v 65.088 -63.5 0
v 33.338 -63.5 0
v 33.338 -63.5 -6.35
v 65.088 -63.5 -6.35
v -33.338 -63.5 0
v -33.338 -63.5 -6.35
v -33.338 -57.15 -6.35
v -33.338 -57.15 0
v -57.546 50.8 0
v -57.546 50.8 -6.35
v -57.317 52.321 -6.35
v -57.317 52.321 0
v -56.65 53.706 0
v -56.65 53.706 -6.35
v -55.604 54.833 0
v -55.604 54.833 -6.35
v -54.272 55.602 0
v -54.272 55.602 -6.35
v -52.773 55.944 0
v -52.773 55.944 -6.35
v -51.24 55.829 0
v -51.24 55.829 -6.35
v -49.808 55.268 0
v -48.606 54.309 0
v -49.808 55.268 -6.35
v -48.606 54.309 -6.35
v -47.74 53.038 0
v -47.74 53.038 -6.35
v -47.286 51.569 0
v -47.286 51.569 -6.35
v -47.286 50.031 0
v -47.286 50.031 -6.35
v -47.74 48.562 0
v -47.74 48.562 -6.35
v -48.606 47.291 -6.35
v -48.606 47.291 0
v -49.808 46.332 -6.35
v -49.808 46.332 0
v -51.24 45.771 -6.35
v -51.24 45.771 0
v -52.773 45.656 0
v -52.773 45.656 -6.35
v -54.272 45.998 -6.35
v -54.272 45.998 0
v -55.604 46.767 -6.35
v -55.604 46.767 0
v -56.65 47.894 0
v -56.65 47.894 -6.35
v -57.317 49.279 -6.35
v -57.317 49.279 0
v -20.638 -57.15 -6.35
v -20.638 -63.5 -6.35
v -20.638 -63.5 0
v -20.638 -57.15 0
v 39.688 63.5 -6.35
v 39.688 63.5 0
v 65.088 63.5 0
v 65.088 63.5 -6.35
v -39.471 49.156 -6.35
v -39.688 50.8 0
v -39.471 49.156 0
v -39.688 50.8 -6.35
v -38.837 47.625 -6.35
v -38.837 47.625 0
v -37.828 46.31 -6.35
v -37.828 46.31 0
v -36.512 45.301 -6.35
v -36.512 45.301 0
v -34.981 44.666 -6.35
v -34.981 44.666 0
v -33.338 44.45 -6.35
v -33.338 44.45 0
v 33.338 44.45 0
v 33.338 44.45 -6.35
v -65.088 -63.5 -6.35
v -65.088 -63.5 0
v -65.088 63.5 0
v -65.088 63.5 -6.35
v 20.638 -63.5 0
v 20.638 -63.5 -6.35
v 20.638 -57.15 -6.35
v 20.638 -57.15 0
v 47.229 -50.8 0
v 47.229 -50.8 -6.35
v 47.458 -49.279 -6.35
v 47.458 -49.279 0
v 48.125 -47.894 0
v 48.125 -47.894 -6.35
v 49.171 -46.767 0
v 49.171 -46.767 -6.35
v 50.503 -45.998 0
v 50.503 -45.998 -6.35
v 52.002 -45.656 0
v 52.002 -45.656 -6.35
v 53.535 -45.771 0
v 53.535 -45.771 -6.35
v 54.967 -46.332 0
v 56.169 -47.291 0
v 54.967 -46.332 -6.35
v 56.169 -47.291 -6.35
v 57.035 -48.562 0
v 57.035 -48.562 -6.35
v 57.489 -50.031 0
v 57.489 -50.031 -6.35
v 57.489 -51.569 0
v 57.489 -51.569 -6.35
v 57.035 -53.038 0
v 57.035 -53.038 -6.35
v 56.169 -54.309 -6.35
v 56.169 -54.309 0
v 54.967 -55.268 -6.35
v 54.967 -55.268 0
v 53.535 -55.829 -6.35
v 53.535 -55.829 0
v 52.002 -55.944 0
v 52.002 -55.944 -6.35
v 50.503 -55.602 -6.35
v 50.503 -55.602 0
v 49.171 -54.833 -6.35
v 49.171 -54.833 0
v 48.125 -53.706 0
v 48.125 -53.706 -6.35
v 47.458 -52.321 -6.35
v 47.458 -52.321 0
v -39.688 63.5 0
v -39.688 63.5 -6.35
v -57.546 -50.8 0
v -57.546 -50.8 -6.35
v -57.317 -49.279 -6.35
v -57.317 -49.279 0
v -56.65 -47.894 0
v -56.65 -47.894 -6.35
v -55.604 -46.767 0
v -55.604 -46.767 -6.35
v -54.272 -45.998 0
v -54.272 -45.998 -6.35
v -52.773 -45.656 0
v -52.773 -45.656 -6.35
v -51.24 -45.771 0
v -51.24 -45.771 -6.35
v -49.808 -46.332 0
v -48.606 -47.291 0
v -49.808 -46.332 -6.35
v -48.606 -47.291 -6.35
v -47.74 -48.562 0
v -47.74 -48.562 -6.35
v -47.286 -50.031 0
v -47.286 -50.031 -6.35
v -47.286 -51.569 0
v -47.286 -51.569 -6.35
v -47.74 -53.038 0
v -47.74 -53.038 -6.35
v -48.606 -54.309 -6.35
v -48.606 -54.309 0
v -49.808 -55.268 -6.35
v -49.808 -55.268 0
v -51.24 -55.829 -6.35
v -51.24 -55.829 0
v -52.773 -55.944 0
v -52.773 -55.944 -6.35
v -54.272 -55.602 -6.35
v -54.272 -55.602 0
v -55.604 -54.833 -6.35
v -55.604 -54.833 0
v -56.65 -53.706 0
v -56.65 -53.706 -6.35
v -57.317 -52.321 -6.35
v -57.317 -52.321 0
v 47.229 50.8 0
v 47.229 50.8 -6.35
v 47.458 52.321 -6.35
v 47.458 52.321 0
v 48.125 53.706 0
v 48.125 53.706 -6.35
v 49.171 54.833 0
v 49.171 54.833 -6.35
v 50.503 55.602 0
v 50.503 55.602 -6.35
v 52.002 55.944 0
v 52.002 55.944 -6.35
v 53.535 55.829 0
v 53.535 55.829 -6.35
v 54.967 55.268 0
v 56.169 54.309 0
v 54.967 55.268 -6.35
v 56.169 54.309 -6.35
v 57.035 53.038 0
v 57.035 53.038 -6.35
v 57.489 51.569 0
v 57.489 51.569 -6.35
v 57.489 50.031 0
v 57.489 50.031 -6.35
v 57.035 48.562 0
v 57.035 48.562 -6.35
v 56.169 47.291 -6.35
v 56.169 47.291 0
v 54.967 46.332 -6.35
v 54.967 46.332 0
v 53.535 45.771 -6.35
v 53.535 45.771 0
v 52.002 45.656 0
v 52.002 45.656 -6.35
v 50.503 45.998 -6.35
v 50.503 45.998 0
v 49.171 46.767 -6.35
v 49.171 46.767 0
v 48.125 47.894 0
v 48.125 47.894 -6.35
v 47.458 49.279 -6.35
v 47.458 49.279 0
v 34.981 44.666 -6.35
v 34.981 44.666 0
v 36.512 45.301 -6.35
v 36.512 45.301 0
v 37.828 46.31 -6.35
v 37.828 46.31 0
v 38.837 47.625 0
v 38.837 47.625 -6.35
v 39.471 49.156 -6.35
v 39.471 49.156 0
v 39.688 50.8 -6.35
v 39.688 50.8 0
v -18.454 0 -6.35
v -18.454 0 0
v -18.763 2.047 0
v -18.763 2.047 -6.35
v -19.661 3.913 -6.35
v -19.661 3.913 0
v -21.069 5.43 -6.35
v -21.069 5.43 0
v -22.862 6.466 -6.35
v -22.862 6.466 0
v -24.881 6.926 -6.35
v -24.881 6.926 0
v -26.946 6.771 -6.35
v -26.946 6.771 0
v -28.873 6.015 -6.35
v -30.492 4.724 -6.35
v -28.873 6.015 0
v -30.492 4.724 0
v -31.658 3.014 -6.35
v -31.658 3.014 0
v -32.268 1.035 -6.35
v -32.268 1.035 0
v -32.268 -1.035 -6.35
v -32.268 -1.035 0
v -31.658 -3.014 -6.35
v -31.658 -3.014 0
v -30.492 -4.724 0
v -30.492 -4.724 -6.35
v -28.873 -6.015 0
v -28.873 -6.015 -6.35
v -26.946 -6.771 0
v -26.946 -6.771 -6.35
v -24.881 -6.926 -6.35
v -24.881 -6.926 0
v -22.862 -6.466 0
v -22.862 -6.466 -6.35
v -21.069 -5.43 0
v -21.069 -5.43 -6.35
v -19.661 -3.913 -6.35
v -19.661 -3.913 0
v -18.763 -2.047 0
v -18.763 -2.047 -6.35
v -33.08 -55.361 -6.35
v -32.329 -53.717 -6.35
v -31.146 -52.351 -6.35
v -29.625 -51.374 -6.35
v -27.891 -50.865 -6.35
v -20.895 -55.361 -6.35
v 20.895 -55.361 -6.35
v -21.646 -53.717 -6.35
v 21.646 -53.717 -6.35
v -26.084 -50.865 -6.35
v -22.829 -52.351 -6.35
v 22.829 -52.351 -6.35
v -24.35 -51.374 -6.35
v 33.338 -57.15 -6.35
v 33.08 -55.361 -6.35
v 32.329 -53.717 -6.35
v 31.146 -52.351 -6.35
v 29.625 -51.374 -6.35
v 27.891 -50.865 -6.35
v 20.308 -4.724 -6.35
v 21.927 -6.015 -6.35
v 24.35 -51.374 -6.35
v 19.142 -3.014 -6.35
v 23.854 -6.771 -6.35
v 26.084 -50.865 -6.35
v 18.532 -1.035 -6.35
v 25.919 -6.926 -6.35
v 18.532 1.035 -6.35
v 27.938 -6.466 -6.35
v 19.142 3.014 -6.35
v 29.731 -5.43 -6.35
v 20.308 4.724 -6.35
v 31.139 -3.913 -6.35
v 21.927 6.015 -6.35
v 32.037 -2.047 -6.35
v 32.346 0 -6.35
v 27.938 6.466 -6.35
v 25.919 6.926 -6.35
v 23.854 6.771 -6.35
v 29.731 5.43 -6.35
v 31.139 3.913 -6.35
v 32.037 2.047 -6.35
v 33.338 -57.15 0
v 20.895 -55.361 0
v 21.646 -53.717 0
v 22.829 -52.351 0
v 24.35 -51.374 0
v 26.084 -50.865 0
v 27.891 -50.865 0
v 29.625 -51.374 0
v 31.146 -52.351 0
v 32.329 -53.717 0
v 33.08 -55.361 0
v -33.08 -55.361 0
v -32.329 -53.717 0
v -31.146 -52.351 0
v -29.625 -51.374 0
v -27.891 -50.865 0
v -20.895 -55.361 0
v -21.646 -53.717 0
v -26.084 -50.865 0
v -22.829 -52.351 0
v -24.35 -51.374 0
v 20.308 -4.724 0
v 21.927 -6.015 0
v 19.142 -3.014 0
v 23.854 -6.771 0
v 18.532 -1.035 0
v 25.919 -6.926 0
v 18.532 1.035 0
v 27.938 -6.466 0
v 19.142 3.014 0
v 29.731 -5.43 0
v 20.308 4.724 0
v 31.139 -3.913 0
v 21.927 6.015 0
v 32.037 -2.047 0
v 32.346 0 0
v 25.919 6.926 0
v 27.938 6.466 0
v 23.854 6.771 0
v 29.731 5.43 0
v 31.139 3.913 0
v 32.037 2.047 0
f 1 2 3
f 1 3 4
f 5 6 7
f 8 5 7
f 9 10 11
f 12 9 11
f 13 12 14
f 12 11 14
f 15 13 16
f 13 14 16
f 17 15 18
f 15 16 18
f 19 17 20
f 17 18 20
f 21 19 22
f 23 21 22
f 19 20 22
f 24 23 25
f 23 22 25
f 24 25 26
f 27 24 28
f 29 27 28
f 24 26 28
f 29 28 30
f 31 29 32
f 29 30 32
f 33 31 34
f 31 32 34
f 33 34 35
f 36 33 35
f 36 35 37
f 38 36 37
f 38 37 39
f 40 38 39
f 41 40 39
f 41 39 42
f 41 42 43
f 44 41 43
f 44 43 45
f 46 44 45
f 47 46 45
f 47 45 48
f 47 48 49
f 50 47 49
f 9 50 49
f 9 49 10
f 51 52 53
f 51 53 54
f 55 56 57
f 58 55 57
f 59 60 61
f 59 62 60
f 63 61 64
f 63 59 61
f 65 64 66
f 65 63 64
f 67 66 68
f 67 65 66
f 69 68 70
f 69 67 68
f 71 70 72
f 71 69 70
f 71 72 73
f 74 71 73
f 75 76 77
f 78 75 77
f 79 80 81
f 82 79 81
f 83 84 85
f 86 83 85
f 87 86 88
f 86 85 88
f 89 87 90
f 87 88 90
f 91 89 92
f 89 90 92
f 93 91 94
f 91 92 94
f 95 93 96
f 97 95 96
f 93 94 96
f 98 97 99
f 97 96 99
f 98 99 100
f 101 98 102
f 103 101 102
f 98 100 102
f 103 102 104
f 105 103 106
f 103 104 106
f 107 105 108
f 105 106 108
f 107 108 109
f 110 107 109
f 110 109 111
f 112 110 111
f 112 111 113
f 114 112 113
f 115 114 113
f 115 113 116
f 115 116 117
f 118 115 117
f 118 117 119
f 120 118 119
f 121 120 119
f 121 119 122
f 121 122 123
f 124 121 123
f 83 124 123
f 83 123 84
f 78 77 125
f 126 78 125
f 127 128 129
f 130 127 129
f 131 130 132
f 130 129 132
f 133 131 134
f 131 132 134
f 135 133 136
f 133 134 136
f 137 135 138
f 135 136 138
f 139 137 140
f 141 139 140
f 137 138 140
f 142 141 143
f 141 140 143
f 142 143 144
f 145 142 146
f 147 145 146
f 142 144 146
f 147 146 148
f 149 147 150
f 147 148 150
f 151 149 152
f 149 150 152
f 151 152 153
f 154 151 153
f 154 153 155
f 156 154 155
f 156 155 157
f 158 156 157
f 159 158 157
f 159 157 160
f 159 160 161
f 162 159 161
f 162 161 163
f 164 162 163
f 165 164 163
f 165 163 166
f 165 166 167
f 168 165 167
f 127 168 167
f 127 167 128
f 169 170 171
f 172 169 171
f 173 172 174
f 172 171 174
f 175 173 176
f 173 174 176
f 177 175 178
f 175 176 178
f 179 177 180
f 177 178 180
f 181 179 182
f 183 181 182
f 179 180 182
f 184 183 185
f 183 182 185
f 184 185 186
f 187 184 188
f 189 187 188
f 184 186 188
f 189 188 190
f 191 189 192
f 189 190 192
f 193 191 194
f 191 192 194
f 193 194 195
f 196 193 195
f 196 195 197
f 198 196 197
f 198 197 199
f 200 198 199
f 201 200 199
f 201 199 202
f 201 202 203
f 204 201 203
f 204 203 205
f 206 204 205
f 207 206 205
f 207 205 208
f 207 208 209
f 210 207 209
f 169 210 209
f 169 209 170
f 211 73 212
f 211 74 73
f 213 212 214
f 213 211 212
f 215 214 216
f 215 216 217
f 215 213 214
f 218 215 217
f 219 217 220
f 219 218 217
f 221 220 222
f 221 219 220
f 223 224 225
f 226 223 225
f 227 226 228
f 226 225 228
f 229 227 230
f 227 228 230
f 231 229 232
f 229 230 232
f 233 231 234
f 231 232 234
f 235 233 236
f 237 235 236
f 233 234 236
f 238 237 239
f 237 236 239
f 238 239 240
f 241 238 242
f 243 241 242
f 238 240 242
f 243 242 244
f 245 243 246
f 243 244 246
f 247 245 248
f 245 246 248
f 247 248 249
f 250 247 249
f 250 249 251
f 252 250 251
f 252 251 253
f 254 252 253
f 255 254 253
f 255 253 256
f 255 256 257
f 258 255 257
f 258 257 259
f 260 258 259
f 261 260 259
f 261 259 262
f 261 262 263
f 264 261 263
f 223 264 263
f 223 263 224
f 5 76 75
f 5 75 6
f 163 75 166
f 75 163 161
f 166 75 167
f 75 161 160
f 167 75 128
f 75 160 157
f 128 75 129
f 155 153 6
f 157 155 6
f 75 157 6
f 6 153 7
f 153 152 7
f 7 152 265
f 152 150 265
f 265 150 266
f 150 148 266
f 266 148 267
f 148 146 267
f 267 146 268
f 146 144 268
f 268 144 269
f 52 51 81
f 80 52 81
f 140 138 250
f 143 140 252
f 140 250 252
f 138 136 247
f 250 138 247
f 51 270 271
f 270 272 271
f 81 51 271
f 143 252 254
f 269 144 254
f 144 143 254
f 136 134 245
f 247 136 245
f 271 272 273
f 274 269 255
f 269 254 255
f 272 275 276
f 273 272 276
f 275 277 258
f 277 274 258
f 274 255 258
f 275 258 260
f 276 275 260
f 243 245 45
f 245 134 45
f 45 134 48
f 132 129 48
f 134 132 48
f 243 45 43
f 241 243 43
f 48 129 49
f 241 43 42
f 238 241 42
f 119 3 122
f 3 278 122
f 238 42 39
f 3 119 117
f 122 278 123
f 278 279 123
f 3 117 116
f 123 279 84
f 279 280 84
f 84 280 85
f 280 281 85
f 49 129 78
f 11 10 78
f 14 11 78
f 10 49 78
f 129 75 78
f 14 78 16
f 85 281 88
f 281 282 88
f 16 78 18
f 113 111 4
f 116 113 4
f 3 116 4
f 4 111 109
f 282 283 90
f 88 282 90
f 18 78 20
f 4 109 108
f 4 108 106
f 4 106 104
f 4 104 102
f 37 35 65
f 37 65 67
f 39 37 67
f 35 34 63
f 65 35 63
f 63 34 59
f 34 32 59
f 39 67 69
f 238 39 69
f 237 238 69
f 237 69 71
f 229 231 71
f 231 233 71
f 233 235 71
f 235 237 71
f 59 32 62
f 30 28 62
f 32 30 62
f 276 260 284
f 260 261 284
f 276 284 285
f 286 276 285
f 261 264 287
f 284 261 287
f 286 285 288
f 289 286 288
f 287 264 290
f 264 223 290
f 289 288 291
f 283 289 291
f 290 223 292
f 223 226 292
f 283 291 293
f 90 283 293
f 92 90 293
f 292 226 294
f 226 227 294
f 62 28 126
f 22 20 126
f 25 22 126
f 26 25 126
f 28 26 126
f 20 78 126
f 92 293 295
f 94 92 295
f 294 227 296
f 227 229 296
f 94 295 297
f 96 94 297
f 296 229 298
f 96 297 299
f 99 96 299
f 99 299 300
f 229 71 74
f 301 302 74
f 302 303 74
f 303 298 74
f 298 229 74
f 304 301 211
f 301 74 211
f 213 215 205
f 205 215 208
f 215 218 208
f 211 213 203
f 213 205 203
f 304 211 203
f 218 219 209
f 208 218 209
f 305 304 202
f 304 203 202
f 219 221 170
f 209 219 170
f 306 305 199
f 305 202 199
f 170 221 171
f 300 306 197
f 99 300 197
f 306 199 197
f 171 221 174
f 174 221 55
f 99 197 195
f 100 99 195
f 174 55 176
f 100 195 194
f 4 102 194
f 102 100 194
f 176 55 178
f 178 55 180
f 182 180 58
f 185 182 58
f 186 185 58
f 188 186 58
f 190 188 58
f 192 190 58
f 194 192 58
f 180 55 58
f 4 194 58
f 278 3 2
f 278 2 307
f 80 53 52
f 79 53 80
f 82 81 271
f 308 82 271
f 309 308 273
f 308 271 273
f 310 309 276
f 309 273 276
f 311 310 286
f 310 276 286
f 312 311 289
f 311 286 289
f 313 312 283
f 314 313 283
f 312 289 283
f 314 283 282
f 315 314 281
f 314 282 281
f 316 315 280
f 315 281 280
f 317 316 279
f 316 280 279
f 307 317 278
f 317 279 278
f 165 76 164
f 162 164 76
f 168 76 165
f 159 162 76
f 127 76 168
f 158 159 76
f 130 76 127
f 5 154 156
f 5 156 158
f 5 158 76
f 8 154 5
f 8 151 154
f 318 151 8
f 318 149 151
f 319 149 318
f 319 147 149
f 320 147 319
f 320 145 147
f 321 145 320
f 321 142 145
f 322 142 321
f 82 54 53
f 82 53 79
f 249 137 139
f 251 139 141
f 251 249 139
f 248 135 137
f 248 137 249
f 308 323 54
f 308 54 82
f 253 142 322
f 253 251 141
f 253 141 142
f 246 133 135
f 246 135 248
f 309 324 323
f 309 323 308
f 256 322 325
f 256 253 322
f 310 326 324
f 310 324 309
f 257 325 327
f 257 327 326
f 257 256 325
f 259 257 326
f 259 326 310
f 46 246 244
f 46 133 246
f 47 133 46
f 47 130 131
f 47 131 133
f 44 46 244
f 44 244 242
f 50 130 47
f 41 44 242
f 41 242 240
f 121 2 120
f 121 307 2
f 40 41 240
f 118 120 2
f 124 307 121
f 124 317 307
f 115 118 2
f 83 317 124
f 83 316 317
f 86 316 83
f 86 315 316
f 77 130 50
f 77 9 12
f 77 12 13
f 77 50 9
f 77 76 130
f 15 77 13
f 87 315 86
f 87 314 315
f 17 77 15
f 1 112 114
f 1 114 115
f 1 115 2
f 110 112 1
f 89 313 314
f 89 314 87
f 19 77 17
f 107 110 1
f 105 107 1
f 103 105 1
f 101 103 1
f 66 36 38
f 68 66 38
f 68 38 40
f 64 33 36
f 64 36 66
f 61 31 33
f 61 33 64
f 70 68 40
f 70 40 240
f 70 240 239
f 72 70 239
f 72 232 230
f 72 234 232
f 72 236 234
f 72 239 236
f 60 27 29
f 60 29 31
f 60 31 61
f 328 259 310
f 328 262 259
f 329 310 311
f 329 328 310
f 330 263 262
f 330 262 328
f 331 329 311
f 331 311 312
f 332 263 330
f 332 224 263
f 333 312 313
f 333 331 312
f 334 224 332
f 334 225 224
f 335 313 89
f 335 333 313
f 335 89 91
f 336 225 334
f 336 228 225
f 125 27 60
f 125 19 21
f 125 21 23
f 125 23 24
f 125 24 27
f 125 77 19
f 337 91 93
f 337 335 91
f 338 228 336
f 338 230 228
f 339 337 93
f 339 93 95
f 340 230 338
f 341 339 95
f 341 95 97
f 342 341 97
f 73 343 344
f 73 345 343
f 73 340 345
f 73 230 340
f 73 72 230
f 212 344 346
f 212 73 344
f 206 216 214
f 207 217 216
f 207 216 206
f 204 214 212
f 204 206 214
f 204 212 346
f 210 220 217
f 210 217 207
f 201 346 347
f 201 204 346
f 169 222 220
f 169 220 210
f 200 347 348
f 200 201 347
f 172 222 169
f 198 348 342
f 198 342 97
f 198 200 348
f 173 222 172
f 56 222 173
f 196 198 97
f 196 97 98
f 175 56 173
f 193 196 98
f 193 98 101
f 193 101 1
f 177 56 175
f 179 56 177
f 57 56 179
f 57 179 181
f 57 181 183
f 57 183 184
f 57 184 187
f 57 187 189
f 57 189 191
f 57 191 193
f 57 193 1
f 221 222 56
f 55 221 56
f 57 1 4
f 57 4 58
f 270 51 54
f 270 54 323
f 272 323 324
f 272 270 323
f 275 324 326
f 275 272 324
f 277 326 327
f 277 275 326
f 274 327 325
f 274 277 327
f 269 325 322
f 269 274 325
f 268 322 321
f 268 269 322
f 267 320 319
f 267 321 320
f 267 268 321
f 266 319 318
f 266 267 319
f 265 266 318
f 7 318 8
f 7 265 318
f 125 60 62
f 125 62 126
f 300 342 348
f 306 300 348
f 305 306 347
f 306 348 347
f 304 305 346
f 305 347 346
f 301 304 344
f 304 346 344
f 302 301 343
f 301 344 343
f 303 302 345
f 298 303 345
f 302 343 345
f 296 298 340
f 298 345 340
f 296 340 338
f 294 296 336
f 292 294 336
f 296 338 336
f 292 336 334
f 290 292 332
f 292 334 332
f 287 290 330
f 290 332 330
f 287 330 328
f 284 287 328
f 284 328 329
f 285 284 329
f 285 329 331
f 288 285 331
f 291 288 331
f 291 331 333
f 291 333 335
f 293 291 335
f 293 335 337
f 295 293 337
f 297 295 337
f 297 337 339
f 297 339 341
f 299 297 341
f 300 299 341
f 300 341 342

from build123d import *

# Parameters (mm, degrees)
SKETCH1_W               = 130.175
SKETCH1_H               = 127
EXTRUDE1_DEPTH          = 6.35
F_3_8_CLEARANCE_HOLE1_D = 10.31748
SKETCH4_W               = 79.375
SKETCH4_H               = 19.05
EXTRUDE2_DEPTH          = 92.153470347
FILLET2_R               = 6.35
SKETCH5_W               = 12.7
SKETCH5_H               = 6.35
EXTRUDE3_DEPTH          = 92.153470347
SKETCH6_R               = 6.35
EXTRUDE4_DEPTH          = 92.153470347
F_1_2_CLEARANCE_HOLE1_D = 13.89126


with BuildPart() as part:
    # Sketch1 → Extrude1 (new body)
    with BuildSketch(Plane.XY):
        Rectangle(SKETCH1_W, SKETCH1_H)
    extrude(amount=-EXTRUDE1_DEPTH)

    # 3/8 Clearance Hole1 (through all)
    with Locations(Plane.XY):
        with Locations((-52.3875, 50.8), (52.3875, 50.8), (52.3875, -50.8), (-52.3875, -50.8)):
            Hole(F_3_8_CLEARANCE_HOLE1_D / 2)

    # Sketch4 → Extrude2 (cut, through all)
    with BuildSketch(Plane.XY):
        with Locations((0, 53.975)):
            Rectangle(SKETCH4_W, SKETCH4_H)
    extrude(amount=-EXTRUDE2_DEPTH, mode=Mode.SUBTRACT)

    # Fillet2
    fillet2_edges = [part.edges().sort_by_distance(p)[0] for p in [
        (-39.6875, 44.45, -3.175),
        (39.6875, 44.45, -3.175),
    ]]
    fillet(fillet2_edges, radius=FILLET2_R)

    # Sketch5 → Extrude3 (cut, through all)
    with BuildSketch(Plane(origin=(0, 0, -6.35), x_dir=(-1, 0, 0), z_dir=(0, 0, -1))):
        with Locations((-26.9875, -60.325)):
            Rectangle(SKETCH5_W, SKETCH5_H)
    extrude3 = extrude(amount=-EXTRUDE3_DEPTH, mode=Mode.SUBTRACT)

    # Sketch6 → Extrude4 (cut, through all)
    with BuildSketch(Plane(origin=(0, 0, -6.35), x_dir=(-1, 0, 0), z_dir=(0, 0, -1))):
        with Locations((-26.9875, -57.15)):
            Circle(SKETCH6_R)
    extrude4 = extrude(amount=-EXTRUDE4_DEPTH, mode=Mode.SUBTRACT)

    # Mirror2: Extrude3, Extrude4 across plane
    add(extrude3.mirror(Plane(origin=(0, 0, 0), x_dir=(0, 0, 1), z_dir=(1, 0, 0))), mode=Mode.SUBTRACT)
    add(extrude4.mirror(Plane(origin=(0, 0, 0), x_dir=(0, 0, 1), z_dir=(1, 0, 0))), mode=Mode.SUBTRACT)

    # 1/2 Clearance Hole1 (through all)
    with Locations(Plane(origin=(0, 0, -6.35), x_dir=(-1, 0, 0), z_dir=(0, 0, -1))):
        with Locations((-25.4, 0), (25.4, 0)):
            Hole(F_1_2_CLEARANCE_HOLE1_D / 2)


solid = part.part
